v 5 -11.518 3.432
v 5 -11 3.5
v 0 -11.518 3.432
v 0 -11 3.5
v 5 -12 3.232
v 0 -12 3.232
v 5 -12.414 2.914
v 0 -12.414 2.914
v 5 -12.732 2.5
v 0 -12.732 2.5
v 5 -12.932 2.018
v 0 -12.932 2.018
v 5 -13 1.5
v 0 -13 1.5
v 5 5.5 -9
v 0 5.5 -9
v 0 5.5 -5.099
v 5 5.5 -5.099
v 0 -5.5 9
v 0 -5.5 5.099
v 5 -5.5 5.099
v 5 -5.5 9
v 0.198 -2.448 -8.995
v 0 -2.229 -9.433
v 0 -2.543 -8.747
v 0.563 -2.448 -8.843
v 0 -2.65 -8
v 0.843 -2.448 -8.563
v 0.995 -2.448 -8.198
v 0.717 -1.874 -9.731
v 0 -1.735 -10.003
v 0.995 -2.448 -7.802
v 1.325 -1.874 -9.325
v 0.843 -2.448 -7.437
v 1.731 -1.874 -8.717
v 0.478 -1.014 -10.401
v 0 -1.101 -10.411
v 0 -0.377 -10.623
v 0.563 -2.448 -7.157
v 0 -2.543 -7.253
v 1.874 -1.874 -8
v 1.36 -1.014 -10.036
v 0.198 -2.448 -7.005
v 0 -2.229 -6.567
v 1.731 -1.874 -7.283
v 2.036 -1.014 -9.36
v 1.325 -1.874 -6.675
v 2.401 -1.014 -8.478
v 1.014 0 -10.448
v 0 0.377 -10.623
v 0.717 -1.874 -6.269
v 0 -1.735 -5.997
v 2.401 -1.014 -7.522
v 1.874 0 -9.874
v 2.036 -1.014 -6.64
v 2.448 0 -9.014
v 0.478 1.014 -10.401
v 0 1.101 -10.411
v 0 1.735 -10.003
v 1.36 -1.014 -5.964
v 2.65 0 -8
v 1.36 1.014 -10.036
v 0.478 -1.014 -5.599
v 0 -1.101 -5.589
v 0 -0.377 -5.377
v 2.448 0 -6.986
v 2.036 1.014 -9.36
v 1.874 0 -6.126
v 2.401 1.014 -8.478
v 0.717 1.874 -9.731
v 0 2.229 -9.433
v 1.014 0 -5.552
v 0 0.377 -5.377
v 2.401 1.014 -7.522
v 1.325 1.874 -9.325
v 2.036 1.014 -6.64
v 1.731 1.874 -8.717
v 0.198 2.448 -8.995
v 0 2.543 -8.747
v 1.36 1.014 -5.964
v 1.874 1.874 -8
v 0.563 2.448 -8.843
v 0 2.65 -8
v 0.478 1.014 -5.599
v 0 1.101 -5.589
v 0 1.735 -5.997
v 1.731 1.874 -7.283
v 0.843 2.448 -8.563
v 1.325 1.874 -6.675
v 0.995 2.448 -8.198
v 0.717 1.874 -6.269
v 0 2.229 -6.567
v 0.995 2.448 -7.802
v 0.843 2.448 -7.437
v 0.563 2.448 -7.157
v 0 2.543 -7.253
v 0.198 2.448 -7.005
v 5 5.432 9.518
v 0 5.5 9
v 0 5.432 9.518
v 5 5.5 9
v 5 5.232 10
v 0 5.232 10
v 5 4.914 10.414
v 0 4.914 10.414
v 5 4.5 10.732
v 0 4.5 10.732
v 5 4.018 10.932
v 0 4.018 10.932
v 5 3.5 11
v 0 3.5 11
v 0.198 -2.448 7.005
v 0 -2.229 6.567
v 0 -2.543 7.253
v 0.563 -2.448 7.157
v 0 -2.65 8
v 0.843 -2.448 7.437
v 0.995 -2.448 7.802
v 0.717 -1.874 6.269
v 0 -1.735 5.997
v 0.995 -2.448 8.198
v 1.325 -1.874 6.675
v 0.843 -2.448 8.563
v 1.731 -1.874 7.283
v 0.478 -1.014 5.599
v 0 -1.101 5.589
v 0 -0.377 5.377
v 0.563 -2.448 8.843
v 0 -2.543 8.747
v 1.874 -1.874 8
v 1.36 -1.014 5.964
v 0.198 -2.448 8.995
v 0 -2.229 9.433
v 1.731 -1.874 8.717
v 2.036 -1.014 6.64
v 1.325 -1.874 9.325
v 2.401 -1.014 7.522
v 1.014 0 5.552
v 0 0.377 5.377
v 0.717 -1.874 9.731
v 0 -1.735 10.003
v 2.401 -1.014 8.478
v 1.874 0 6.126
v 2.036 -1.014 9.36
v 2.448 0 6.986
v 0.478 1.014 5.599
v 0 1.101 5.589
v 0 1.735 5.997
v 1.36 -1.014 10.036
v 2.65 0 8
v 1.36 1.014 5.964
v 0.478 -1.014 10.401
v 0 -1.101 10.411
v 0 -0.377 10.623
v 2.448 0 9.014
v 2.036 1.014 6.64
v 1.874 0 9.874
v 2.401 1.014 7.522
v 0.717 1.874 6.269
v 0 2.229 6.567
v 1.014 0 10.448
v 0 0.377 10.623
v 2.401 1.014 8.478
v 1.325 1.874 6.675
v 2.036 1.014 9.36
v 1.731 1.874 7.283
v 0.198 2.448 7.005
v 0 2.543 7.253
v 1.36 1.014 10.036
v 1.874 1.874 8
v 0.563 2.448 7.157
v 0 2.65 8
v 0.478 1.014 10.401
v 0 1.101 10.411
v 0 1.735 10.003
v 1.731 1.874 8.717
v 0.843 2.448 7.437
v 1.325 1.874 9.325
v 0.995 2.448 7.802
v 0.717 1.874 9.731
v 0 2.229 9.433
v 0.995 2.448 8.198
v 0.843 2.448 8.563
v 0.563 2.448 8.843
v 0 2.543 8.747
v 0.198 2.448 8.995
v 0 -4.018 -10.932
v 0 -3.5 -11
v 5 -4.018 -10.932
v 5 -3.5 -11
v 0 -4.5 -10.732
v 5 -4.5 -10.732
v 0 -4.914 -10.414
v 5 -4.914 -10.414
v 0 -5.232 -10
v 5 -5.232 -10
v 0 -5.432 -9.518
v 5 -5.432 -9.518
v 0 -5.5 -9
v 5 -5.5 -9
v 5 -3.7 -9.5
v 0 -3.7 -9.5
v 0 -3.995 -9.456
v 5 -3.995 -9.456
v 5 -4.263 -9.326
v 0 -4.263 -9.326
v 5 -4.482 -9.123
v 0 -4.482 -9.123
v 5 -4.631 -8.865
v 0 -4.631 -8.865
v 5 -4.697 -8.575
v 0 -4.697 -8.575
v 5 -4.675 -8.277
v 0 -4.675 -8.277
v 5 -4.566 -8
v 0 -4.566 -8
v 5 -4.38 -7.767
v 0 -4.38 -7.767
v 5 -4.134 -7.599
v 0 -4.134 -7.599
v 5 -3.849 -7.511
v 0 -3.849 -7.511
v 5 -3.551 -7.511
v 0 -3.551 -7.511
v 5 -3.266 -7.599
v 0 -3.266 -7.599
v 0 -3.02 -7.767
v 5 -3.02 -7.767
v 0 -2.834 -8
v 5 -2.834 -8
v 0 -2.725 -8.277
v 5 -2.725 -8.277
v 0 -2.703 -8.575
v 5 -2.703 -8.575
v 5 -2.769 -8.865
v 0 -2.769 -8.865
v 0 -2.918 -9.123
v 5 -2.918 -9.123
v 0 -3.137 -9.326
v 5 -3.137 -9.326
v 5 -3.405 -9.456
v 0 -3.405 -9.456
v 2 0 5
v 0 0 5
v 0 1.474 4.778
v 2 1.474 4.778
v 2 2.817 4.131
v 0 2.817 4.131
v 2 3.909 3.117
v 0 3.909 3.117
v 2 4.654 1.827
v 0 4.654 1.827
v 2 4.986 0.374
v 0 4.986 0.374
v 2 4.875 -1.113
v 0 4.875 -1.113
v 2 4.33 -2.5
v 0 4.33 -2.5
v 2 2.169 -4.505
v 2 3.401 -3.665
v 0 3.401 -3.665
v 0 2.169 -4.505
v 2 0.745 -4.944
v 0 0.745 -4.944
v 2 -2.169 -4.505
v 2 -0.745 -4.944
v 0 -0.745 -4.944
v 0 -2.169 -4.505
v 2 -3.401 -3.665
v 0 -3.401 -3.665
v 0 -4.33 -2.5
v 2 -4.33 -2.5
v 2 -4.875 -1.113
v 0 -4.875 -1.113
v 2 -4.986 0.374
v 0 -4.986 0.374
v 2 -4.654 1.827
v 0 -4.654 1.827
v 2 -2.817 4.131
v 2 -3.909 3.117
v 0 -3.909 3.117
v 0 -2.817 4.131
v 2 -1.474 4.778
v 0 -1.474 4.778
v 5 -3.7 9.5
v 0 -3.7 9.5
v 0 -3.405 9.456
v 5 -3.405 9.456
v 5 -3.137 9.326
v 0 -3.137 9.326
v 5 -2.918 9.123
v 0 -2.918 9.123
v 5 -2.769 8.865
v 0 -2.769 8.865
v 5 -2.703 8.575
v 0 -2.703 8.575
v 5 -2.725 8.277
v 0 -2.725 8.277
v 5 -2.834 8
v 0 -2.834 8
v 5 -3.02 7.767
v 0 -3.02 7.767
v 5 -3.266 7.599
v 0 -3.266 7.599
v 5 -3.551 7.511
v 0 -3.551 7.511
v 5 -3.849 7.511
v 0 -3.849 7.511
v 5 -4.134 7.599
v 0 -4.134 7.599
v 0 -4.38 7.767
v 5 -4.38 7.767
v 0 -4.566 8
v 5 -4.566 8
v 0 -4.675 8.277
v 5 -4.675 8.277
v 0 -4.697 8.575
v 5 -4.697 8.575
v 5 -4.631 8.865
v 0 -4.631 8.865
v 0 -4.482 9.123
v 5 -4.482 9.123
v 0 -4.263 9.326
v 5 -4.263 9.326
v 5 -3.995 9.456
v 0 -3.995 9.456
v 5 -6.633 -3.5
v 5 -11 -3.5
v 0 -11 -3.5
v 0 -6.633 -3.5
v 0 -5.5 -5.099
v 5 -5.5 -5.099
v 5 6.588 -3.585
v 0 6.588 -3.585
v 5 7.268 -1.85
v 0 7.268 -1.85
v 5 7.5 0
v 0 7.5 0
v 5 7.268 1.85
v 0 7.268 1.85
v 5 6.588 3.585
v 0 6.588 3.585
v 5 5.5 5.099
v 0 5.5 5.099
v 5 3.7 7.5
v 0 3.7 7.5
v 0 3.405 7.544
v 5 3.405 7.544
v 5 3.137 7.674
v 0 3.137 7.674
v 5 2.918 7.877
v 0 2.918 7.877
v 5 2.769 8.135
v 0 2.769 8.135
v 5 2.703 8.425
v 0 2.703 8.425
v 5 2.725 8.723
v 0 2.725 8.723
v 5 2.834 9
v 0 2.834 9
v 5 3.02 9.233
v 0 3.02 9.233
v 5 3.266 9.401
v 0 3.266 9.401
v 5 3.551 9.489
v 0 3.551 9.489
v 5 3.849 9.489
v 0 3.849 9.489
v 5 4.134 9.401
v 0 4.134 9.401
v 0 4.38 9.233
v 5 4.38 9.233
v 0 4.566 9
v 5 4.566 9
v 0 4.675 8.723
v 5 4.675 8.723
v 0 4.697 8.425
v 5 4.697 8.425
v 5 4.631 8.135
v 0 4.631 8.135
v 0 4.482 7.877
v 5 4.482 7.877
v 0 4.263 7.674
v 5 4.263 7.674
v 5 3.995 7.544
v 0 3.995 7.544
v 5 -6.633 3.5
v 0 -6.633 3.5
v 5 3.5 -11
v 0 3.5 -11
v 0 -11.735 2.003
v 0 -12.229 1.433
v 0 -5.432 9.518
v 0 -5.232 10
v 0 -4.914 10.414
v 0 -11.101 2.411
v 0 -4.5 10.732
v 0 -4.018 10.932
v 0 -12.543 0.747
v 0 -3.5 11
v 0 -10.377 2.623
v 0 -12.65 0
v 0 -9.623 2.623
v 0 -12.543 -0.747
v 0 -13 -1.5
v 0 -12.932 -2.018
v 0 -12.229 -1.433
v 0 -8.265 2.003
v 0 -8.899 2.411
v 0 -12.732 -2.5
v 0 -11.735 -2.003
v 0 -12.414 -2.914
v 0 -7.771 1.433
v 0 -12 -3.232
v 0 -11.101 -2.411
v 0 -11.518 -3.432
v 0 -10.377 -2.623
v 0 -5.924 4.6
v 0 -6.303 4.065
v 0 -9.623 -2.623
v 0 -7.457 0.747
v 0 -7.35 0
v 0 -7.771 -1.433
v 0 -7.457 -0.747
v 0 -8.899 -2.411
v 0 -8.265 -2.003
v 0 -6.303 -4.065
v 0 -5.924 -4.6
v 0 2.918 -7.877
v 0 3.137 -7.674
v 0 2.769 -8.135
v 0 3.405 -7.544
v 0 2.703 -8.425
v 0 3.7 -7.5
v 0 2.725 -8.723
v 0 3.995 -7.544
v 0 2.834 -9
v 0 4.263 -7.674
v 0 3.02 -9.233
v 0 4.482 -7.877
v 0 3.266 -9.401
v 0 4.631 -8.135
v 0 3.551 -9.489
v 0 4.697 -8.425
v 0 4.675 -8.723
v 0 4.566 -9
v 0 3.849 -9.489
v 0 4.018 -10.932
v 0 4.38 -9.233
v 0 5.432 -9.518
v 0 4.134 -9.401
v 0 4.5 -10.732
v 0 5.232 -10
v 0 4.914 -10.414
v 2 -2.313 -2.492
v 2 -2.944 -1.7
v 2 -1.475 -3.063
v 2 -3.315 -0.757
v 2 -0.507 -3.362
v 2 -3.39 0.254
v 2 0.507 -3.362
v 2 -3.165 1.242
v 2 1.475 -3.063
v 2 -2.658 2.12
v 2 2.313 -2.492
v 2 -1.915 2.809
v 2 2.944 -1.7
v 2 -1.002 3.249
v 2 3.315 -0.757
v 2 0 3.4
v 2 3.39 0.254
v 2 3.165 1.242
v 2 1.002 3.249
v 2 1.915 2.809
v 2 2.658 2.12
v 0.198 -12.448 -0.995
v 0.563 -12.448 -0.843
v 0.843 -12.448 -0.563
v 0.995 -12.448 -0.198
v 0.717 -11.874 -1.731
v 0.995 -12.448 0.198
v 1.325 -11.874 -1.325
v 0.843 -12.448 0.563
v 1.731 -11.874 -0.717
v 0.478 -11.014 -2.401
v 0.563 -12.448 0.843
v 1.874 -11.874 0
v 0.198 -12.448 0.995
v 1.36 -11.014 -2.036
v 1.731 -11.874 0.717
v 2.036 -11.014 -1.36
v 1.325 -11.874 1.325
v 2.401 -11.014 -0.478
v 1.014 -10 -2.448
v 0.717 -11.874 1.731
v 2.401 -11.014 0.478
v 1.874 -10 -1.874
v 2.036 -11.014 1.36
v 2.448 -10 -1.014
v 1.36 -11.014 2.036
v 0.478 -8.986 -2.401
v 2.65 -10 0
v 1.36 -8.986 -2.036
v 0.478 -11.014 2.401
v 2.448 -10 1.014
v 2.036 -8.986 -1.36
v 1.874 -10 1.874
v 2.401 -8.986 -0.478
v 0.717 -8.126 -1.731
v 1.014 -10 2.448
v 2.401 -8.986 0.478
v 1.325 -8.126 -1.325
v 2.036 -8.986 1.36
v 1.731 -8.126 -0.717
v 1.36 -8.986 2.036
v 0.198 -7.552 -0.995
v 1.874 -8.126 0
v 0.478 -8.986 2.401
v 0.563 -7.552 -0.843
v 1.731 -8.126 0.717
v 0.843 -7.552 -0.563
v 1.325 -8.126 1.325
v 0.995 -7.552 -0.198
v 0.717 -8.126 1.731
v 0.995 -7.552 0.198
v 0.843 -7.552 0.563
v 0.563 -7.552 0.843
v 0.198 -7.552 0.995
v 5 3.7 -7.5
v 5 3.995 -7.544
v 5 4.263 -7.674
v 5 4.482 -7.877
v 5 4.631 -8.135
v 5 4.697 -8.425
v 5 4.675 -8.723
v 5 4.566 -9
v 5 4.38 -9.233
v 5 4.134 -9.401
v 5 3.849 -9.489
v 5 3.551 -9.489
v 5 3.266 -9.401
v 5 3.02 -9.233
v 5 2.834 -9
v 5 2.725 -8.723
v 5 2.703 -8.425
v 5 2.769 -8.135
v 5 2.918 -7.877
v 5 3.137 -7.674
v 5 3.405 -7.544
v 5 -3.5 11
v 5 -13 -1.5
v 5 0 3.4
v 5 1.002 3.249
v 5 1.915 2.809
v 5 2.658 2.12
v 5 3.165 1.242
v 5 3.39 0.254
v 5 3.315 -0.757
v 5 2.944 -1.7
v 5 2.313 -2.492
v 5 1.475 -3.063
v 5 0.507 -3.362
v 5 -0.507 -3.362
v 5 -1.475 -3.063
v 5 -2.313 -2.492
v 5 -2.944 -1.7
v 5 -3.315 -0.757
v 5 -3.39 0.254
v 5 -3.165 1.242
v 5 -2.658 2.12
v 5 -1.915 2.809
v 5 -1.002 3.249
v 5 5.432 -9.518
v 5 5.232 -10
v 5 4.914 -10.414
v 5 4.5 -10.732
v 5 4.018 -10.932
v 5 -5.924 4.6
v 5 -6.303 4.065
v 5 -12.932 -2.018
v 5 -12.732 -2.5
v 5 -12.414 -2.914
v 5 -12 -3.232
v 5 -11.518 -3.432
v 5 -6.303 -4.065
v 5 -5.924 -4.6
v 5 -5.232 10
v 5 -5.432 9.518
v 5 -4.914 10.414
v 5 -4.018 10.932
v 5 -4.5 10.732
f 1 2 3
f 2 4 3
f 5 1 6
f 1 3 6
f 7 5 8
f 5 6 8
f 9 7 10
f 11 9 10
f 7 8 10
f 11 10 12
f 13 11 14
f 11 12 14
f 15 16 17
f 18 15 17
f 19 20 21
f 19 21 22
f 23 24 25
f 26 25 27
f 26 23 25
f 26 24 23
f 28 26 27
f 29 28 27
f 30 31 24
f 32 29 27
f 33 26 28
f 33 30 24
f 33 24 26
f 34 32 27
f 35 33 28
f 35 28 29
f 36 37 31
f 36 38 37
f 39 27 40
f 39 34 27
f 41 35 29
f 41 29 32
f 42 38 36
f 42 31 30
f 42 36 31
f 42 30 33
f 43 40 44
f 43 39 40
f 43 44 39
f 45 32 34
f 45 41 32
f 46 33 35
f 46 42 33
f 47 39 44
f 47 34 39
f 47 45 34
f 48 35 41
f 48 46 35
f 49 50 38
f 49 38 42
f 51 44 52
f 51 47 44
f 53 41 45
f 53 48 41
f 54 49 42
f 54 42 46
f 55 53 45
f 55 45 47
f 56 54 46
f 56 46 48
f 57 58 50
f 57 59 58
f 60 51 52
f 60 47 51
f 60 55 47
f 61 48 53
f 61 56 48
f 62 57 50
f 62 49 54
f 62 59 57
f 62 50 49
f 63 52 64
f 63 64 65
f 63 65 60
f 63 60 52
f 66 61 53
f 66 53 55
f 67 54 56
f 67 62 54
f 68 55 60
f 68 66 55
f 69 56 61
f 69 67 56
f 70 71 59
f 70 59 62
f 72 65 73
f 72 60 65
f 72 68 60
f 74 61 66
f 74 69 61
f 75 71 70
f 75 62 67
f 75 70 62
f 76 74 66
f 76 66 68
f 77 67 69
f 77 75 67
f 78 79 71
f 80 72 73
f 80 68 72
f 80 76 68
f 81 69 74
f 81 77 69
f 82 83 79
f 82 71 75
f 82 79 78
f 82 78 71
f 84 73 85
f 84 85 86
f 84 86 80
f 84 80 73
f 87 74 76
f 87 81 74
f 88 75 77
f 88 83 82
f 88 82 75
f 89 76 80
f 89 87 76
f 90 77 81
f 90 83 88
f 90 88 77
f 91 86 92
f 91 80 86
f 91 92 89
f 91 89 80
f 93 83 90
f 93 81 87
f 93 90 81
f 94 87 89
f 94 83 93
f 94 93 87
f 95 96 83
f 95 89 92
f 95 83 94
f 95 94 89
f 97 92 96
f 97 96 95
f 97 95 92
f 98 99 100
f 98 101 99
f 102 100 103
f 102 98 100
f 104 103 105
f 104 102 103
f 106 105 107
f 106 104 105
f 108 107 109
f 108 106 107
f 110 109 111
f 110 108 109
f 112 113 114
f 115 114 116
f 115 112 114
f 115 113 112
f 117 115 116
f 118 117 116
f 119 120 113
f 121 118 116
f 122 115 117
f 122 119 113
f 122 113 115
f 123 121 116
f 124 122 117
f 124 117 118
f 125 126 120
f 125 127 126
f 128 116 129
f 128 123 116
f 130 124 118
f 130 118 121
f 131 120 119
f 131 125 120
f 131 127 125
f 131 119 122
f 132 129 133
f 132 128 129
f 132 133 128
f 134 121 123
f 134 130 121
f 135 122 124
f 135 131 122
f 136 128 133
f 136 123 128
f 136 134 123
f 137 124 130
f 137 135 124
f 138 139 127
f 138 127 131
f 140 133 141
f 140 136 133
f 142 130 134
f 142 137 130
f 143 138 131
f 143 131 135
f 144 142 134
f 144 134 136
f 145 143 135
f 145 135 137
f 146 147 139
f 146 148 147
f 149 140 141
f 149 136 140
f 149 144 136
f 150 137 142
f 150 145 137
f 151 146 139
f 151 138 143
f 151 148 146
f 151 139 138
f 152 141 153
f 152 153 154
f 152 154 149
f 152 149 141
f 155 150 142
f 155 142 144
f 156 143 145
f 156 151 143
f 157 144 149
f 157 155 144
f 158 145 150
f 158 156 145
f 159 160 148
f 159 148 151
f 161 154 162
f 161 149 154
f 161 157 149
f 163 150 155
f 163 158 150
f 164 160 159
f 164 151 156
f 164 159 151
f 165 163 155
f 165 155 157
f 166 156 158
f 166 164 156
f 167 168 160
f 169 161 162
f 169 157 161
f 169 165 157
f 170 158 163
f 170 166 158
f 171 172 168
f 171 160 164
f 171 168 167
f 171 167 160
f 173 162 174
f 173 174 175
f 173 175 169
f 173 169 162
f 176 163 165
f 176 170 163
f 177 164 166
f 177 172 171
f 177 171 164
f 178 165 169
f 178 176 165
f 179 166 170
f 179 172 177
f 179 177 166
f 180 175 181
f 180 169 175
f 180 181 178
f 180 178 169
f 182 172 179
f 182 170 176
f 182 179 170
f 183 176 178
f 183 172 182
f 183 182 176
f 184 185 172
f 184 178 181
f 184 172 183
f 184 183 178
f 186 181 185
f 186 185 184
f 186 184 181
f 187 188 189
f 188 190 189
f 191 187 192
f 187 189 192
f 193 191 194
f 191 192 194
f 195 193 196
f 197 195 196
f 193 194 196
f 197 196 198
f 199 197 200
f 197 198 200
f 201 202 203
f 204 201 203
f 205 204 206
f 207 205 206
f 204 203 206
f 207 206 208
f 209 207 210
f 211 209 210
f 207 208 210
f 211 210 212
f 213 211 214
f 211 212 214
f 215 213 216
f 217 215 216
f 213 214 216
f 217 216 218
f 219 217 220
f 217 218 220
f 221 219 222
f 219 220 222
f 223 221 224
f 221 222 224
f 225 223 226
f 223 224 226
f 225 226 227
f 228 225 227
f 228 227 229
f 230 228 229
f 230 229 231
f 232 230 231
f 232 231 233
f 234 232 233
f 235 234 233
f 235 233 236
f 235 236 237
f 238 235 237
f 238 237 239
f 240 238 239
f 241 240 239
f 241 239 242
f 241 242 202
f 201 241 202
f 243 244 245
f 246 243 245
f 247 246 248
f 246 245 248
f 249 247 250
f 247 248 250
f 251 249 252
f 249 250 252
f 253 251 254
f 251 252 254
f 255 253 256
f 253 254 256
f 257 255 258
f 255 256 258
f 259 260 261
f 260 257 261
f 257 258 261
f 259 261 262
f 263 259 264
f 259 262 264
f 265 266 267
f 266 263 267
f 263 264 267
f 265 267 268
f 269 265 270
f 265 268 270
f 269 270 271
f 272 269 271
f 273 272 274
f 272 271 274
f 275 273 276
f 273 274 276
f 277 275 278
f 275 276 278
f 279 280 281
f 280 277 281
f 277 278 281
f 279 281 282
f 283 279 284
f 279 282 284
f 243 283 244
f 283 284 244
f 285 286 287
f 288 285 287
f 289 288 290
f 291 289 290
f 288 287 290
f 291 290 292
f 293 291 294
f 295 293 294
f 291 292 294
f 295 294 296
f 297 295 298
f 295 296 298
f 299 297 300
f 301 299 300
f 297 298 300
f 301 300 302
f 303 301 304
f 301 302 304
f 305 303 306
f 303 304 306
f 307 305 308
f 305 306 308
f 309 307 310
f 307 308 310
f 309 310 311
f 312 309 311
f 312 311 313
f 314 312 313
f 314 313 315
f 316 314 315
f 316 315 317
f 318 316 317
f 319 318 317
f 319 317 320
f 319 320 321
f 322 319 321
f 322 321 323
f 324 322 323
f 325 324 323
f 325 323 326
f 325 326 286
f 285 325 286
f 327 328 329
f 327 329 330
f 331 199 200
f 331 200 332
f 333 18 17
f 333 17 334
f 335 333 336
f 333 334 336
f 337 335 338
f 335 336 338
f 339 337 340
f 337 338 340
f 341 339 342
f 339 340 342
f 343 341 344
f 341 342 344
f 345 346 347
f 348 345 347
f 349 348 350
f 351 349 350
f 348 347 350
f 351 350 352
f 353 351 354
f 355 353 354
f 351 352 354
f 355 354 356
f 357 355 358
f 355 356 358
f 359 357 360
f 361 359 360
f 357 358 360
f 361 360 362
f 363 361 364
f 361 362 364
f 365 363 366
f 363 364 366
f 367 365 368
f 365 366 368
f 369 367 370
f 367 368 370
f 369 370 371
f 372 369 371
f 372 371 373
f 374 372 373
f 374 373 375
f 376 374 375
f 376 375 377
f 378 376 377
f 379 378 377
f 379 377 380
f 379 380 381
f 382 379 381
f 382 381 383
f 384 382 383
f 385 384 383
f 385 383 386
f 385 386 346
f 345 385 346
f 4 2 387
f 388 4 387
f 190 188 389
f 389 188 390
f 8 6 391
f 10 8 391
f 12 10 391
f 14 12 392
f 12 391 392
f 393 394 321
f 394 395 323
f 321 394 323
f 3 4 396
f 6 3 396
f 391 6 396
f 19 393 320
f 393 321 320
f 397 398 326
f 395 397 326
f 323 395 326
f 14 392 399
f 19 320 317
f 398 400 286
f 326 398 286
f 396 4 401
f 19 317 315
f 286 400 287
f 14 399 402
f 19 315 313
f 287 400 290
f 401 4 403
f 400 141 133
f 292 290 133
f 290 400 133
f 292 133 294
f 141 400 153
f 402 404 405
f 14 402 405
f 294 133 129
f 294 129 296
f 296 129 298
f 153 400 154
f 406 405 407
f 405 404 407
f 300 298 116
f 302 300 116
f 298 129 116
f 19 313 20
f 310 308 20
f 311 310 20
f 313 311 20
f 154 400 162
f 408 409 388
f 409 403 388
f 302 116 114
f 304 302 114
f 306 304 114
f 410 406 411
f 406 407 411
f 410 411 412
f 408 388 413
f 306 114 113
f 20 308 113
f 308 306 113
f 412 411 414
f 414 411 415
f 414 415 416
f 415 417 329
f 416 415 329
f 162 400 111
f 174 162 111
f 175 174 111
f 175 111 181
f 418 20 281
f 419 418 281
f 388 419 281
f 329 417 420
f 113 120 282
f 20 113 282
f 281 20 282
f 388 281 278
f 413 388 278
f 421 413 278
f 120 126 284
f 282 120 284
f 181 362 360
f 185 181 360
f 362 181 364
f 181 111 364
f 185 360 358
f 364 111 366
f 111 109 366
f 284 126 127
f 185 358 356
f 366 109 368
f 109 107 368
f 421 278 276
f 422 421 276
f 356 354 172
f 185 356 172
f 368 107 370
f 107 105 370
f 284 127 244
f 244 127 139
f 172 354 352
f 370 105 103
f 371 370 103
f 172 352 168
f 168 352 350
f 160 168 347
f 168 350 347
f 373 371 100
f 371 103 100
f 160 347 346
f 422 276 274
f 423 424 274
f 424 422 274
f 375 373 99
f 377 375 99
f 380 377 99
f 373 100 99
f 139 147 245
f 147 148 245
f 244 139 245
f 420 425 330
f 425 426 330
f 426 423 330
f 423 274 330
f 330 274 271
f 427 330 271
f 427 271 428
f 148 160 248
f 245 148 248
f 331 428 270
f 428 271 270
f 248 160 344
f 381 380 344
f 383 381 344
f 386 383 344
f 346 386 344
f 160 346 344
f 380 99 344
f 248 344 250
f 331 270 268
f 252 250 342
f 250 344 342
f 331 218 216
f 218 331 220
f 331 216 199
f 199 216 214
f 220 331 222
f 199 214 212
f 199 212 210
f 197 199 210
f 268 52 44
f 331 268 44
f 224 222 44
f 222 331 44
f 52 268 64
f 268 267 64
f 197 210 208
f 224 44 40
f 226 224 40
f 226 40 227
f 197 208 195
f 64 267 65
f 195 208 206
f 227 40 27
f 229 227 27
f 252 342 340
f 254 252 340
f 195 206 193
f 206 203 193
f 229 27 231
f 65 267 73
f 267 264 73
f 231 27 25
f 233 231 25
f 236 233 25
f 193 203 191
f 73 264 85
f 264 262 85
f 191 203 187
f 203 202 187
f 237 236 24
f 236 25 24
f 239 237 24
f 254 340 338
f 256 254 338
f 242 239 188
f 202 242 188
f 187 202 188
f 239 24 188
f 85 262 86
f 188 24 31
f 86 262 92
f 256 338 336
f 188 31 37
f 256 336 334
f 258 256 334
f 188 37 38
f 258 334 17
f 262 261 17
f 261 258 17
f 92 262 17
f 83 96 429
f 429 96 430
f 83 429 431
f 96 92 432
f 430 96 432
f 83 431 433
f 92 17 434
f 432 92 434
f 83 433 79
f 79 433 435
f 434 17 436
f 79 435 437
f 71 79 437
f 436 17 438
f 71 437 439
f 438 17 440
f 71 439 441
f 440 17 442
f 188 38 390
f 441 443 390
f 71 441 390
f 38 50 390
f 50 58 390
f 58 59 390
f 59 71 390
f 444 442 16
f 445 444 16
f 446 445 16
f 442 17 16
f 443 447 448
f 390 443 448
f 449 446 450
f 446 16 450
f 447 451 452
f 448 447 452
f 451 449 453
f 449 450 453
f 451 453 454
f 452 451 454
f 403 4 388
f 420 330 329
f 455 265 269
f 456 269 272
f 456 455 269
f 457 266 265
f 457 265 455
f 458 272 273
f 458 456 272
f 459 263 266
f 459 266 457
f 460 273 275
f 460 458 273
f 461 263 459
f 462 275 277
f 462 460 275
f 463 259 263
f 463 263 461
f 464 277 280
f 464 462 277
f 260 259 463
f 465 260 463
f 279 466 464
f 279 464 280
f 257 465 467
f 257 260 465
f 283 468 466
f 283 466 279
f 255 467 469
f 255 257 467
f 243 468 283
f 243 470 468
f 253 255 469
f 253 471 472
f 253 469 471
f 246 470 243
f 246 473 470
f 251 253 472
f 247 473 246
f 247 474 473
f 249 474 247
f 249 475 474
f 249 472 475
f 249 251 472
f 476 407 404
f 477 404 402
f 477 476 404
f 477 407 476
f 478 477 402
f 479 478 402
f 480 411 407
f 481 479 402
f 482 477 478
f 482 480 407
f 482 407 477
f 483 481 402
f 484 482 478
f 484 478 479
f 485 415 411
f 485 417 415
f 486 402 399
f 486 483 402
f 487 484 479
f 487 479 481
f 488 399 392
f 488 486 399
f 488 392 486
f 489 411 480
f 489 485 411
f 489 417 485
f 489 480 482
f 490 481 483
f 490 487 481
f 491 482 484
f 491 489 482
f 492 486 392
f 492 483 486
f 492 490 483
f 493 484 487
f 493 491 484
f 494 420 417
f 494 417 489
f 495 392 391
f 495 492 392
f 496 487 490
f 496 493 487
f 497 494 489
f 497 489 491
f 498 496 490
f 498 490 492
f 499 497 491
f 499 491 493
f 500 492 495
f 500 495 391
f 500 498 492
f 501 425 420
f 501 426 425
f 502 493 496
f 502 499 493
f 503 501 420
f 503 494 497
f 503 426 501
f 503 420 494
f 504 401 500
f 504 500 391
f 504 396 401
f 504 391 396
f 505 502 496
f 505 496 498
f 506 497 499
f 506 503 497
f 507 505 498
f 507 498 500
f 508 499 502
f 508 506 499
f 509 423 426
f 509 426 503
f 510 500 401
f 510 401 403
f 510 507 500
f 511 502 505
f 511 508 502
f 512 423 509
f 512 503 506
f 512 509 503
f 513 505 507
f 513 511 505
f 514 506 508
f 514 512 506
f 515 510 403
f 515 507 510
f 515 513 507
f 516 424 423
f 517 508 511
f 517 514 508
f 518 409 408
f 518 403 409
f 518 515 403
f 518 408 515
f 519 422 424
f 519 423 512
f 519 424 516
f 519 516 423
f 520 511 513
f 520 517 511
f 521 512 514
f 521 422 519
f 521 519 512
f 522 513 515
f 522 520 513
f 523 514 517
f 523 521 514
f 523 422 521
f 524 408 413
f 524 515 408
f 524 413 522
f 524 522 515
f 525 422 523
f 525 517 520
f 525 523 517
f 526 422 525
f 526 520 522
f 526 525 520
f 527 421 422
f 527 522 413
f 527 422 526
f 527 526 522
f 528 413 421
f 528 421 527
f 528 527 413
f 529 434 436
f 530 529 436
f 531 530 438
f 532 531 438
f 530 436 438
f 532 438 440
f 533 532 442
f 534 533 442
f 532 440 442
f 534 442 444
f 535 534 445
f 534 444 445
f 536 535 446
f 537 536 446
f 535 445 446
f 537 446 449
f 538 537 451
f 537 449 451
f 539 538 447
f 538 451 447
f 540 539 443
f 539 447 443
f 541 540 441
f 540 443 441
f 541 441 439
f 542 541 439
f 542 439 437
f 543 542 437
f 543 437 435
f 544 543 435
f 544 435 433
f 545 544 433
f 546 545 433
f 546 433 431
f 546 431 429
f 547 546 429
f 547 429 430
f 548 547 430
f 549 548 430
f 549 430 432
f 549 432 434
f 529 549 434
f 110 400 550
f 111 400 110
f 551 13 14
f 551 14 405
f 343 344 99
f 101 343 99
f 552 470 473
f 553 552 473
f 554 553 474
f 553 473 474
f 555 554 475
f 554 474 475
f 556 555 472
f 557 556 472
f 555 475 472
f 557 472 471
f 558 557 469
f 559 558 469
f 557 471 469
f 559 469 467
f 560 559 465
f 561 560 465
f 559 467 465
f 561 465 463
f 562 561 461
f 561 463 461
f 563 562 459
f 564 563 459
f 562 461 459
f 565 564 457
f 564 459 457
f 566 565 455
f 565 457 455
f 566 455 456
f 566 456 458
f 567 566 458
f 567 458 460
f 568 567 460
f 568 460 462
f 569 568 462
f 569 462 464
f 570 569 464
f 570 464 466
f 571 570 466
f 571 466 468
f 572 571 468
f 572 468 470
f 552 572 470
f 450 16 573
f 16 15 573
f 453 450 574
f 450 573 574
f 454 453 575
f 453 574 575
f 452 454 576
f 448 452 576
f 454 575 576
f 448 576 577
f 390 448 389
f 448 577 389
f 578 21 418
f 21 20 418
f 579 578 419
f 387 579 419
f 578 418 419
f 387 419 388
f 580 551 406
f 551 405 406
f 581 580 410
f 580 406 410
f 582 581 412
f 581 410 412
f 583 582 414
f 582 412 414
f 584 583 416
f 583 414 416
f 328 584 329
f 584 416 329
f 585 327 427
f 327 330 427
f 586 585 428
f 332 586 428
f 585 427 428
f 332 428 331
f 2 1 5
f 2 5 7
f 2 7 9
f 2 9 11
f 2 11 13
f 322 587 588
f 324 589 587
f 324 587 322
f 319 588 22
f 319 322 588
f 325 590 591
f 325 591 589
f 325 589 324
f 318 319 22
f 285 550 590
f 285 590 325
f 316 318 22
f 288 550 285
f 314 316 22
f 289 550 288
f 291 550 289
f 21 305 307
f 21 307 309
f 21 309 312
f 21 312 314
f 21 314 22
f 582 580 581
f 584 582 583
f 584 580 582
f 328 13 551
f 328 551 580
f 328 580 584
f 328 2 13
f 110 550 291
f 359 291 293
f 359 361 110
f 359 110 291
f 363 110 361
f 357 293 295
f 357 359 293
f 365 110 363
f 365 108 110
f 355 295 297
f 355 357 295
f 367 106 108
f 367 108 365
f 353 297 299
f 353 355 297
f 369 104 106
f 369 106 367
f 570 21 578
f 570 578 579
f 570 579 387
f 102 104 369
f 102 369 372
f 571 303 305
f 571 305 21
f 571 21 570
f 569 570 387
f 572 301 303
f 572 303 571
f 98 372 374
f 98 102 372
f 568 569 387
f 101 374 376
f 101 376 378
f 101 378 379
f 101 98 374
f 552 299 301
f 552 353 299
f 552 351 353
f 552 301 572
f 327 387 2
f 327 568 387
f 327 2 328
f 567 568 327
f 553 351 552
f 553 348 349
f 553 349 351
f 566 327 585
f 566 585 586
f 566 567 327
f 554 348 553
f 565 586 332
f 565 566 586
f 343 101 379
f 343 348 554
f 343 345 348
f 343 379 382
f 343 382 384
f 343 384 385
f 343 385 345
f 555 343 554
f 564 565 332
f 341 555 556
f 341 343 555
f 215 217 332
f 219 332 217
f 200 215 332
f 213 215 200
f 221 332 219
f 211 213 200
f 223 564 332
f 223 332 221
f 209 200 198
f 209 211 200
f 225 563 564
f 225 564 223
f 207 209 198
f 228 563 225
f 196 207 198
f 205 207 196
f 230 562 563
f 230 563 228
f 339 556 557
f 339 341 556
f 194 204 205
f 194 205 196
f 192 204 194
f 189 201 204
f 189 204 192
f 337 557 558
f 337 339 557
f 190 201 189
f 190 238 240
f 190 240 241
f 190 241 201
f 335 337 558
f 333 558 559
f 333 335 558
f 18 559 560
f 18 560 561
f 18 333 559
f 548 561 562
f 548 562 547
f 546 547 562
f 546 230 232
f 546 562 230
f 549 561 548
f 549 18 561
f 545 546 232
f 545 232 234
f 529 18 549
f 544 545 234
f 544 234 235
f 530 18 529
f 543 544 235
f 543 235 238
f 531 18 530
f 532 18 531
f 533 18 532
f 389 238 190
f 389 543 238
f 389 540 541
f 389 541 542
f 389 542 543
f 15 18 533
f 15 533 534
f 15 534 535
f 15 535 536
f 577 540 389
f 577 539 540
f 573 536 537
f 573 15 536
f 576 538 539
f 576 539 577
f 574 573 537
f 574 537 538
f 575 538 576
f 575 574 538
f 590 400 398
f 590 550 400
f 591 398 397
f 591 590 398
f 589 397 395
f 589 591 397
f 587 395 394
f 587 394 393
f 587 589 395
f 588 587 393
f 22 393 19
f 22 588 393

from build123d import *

# Parameters (mm, degrees)
SKETCH_1_R          = 7.5
EXTRUDE_1_DEPTH     = 5
SKETCH_2_R          = 5
CUT_EXTRUDE_1_DEPTH = 2
SKETCH_3_R          = 3.4
CUT_EXTRUDE_2_DEPTH = 12.022703843
SKETCH_4_W          = 6
SKETCH_4_H          = 11
EXTRUDE_2_DEPTH     = 5
FILLET_1_R          = 2
SKETCH_8_R          = 1
CUT_EXTRUDE_4_DEPTH = 15.221462653
SKETCH_9_W          = 7
SKETCH_9_H          = 7.5
EXTRUDE_3_DEPTH     = 5
FILLET_2_R          = 2


with BuildPart() as part:
    # 草图1 → 凸台-拉伸1 (new body)
    with BuildSketch(Plane(origin=(0, 0, 0), x_dir=(0, 0, -1), z_dir=(1, 0, 0))):
        Circle(SKETCH_1_R)
    extrude(amount=EXTRUDE_1_DEPTH)

    # 草图2 → 切除-拉伸1 (cut)
    with BuildSketch(Plane.ZY):
        Circle(SKETCH_2_R)
    extrude(amount=-CUT_EXTRUDE_1_DEPTH, mode=Mode.SUBTRACT)

    # 草图3 → 切除-拉伸2 (cut, through all)
    with BuildSketch(Plane.ZY.offset(-2)):
        Circle(SKETCH_3_R)
    extrude(amount=-CUT_EXTRUDE_2_DEPTH, mode=Mode.SUBTRACT)

    # 草图4 → 凸台-拉伸2 (add)
    with BuildSketch(Plane.ZY):
        with Locations((8, 0)):
            Rectangle(SKETCH_4_W, SKETCH_4_H)
        with Locations((-8, 0)):
            Rectangle(SKETCH_4_W, SKETCH_4_H)
    extrude(amount=-EXTRUDE_2_DEPTH)

    # 草图6 → 切除-旋转1 (revolve, cut)
    with BuildSketch(Plane.ZY):
        with BuildLine():
            Line((8, 2.65), (8, -2.65))
            ThreePointArc((8, -2.65), (10.65, 0), (8, 2.65))
        make_face()
    revolve(axis=Axis((0, 2.65, 8), (0, -1, 0)), mode=Mode.SUBTRACT)

    # 草图7 → 切除-旋转2 (revolve, cut)
    with BuildSketch(Plane.ZY):
        with BuildLine():
            Line((-8, 2.65), (-8, -2.65))
            ThreePointArc((-8, -2.65), (-5.35, 0), (-8, 2.65))
        make_face()
    revolve(axis=Axis((0, 2.65, -8), (0, -1, 0)), mode=Mode.SUBTRACT)

    # 圆角1
    fillet_1_edges = [part.edges().sort_by_distance(p)[0] for p in [
        (2.5, -5.5, 11),
        (2.5, 5.5, 11),
        (2.5, 5.5, -11),
        (2.5, -5.5, -11),
    ]]
    fillet(fillet_1_edges, radius=FILLET_1_R)

    # 草图8 → 切除-拉伸4 (cut, through all)
    with BuildSketch(Plane.ZY):
        with Locations((8.5, -3.7)):
            Circle(SKETCH_8_R)
        with Locations(Location((8.5, 3.7, 0), (0, 0, 180))):
            Circle(SKETCH_8_R)
        with Locations(Location((-8.5, -3.7, 0), (0, 0, 180))):
            Circle(SKETCH_8_R)
        with Locations((-8.5, 3.7)):
            Circle(SKETCH_8_R)
    extrude(amount=-CUT_EXTRUDE_4_DEPTH, mode=Mode.SUBTRACT)

    # 草图9 → 凸台-拉伸3 (add)
    with BuildSketch(Plane(origin=(5, 0, 0), x_dir=(0, 0, -1), z_dir=(1, 0, 0))):
        with Locations((0, -9.25)):
            Rectangle(SKETCH_9_W, SKETCH_9_H)
    extrude(amount=-EXTRUDE_3_DEPTH)

    # 草图10 → 切除-旋转3 (revolve, cut)
    with BuildSketch(Plane.ZY):
        with BuildLine():
            Line((0, -7.35), (0, -12.65))
            ThreePointArc((0, -12.65), (-2.65, -10), (0, -7.35))
        make_face()
    revolve(axis=Axis((0, -7.35, 0), (0, -1, 0)), mode=Mode.SUBTRACT)

    # 圆角2
    fillet_2_edges = [part.edges().sort_by_distance(p)[0] for p in [
        (2.5, -13, 3.5),
        (2.5, -13, -3.5),
    ]]
    fillet(fillet_2_edges, radius=FILLET_2_R)


solid = part.part
